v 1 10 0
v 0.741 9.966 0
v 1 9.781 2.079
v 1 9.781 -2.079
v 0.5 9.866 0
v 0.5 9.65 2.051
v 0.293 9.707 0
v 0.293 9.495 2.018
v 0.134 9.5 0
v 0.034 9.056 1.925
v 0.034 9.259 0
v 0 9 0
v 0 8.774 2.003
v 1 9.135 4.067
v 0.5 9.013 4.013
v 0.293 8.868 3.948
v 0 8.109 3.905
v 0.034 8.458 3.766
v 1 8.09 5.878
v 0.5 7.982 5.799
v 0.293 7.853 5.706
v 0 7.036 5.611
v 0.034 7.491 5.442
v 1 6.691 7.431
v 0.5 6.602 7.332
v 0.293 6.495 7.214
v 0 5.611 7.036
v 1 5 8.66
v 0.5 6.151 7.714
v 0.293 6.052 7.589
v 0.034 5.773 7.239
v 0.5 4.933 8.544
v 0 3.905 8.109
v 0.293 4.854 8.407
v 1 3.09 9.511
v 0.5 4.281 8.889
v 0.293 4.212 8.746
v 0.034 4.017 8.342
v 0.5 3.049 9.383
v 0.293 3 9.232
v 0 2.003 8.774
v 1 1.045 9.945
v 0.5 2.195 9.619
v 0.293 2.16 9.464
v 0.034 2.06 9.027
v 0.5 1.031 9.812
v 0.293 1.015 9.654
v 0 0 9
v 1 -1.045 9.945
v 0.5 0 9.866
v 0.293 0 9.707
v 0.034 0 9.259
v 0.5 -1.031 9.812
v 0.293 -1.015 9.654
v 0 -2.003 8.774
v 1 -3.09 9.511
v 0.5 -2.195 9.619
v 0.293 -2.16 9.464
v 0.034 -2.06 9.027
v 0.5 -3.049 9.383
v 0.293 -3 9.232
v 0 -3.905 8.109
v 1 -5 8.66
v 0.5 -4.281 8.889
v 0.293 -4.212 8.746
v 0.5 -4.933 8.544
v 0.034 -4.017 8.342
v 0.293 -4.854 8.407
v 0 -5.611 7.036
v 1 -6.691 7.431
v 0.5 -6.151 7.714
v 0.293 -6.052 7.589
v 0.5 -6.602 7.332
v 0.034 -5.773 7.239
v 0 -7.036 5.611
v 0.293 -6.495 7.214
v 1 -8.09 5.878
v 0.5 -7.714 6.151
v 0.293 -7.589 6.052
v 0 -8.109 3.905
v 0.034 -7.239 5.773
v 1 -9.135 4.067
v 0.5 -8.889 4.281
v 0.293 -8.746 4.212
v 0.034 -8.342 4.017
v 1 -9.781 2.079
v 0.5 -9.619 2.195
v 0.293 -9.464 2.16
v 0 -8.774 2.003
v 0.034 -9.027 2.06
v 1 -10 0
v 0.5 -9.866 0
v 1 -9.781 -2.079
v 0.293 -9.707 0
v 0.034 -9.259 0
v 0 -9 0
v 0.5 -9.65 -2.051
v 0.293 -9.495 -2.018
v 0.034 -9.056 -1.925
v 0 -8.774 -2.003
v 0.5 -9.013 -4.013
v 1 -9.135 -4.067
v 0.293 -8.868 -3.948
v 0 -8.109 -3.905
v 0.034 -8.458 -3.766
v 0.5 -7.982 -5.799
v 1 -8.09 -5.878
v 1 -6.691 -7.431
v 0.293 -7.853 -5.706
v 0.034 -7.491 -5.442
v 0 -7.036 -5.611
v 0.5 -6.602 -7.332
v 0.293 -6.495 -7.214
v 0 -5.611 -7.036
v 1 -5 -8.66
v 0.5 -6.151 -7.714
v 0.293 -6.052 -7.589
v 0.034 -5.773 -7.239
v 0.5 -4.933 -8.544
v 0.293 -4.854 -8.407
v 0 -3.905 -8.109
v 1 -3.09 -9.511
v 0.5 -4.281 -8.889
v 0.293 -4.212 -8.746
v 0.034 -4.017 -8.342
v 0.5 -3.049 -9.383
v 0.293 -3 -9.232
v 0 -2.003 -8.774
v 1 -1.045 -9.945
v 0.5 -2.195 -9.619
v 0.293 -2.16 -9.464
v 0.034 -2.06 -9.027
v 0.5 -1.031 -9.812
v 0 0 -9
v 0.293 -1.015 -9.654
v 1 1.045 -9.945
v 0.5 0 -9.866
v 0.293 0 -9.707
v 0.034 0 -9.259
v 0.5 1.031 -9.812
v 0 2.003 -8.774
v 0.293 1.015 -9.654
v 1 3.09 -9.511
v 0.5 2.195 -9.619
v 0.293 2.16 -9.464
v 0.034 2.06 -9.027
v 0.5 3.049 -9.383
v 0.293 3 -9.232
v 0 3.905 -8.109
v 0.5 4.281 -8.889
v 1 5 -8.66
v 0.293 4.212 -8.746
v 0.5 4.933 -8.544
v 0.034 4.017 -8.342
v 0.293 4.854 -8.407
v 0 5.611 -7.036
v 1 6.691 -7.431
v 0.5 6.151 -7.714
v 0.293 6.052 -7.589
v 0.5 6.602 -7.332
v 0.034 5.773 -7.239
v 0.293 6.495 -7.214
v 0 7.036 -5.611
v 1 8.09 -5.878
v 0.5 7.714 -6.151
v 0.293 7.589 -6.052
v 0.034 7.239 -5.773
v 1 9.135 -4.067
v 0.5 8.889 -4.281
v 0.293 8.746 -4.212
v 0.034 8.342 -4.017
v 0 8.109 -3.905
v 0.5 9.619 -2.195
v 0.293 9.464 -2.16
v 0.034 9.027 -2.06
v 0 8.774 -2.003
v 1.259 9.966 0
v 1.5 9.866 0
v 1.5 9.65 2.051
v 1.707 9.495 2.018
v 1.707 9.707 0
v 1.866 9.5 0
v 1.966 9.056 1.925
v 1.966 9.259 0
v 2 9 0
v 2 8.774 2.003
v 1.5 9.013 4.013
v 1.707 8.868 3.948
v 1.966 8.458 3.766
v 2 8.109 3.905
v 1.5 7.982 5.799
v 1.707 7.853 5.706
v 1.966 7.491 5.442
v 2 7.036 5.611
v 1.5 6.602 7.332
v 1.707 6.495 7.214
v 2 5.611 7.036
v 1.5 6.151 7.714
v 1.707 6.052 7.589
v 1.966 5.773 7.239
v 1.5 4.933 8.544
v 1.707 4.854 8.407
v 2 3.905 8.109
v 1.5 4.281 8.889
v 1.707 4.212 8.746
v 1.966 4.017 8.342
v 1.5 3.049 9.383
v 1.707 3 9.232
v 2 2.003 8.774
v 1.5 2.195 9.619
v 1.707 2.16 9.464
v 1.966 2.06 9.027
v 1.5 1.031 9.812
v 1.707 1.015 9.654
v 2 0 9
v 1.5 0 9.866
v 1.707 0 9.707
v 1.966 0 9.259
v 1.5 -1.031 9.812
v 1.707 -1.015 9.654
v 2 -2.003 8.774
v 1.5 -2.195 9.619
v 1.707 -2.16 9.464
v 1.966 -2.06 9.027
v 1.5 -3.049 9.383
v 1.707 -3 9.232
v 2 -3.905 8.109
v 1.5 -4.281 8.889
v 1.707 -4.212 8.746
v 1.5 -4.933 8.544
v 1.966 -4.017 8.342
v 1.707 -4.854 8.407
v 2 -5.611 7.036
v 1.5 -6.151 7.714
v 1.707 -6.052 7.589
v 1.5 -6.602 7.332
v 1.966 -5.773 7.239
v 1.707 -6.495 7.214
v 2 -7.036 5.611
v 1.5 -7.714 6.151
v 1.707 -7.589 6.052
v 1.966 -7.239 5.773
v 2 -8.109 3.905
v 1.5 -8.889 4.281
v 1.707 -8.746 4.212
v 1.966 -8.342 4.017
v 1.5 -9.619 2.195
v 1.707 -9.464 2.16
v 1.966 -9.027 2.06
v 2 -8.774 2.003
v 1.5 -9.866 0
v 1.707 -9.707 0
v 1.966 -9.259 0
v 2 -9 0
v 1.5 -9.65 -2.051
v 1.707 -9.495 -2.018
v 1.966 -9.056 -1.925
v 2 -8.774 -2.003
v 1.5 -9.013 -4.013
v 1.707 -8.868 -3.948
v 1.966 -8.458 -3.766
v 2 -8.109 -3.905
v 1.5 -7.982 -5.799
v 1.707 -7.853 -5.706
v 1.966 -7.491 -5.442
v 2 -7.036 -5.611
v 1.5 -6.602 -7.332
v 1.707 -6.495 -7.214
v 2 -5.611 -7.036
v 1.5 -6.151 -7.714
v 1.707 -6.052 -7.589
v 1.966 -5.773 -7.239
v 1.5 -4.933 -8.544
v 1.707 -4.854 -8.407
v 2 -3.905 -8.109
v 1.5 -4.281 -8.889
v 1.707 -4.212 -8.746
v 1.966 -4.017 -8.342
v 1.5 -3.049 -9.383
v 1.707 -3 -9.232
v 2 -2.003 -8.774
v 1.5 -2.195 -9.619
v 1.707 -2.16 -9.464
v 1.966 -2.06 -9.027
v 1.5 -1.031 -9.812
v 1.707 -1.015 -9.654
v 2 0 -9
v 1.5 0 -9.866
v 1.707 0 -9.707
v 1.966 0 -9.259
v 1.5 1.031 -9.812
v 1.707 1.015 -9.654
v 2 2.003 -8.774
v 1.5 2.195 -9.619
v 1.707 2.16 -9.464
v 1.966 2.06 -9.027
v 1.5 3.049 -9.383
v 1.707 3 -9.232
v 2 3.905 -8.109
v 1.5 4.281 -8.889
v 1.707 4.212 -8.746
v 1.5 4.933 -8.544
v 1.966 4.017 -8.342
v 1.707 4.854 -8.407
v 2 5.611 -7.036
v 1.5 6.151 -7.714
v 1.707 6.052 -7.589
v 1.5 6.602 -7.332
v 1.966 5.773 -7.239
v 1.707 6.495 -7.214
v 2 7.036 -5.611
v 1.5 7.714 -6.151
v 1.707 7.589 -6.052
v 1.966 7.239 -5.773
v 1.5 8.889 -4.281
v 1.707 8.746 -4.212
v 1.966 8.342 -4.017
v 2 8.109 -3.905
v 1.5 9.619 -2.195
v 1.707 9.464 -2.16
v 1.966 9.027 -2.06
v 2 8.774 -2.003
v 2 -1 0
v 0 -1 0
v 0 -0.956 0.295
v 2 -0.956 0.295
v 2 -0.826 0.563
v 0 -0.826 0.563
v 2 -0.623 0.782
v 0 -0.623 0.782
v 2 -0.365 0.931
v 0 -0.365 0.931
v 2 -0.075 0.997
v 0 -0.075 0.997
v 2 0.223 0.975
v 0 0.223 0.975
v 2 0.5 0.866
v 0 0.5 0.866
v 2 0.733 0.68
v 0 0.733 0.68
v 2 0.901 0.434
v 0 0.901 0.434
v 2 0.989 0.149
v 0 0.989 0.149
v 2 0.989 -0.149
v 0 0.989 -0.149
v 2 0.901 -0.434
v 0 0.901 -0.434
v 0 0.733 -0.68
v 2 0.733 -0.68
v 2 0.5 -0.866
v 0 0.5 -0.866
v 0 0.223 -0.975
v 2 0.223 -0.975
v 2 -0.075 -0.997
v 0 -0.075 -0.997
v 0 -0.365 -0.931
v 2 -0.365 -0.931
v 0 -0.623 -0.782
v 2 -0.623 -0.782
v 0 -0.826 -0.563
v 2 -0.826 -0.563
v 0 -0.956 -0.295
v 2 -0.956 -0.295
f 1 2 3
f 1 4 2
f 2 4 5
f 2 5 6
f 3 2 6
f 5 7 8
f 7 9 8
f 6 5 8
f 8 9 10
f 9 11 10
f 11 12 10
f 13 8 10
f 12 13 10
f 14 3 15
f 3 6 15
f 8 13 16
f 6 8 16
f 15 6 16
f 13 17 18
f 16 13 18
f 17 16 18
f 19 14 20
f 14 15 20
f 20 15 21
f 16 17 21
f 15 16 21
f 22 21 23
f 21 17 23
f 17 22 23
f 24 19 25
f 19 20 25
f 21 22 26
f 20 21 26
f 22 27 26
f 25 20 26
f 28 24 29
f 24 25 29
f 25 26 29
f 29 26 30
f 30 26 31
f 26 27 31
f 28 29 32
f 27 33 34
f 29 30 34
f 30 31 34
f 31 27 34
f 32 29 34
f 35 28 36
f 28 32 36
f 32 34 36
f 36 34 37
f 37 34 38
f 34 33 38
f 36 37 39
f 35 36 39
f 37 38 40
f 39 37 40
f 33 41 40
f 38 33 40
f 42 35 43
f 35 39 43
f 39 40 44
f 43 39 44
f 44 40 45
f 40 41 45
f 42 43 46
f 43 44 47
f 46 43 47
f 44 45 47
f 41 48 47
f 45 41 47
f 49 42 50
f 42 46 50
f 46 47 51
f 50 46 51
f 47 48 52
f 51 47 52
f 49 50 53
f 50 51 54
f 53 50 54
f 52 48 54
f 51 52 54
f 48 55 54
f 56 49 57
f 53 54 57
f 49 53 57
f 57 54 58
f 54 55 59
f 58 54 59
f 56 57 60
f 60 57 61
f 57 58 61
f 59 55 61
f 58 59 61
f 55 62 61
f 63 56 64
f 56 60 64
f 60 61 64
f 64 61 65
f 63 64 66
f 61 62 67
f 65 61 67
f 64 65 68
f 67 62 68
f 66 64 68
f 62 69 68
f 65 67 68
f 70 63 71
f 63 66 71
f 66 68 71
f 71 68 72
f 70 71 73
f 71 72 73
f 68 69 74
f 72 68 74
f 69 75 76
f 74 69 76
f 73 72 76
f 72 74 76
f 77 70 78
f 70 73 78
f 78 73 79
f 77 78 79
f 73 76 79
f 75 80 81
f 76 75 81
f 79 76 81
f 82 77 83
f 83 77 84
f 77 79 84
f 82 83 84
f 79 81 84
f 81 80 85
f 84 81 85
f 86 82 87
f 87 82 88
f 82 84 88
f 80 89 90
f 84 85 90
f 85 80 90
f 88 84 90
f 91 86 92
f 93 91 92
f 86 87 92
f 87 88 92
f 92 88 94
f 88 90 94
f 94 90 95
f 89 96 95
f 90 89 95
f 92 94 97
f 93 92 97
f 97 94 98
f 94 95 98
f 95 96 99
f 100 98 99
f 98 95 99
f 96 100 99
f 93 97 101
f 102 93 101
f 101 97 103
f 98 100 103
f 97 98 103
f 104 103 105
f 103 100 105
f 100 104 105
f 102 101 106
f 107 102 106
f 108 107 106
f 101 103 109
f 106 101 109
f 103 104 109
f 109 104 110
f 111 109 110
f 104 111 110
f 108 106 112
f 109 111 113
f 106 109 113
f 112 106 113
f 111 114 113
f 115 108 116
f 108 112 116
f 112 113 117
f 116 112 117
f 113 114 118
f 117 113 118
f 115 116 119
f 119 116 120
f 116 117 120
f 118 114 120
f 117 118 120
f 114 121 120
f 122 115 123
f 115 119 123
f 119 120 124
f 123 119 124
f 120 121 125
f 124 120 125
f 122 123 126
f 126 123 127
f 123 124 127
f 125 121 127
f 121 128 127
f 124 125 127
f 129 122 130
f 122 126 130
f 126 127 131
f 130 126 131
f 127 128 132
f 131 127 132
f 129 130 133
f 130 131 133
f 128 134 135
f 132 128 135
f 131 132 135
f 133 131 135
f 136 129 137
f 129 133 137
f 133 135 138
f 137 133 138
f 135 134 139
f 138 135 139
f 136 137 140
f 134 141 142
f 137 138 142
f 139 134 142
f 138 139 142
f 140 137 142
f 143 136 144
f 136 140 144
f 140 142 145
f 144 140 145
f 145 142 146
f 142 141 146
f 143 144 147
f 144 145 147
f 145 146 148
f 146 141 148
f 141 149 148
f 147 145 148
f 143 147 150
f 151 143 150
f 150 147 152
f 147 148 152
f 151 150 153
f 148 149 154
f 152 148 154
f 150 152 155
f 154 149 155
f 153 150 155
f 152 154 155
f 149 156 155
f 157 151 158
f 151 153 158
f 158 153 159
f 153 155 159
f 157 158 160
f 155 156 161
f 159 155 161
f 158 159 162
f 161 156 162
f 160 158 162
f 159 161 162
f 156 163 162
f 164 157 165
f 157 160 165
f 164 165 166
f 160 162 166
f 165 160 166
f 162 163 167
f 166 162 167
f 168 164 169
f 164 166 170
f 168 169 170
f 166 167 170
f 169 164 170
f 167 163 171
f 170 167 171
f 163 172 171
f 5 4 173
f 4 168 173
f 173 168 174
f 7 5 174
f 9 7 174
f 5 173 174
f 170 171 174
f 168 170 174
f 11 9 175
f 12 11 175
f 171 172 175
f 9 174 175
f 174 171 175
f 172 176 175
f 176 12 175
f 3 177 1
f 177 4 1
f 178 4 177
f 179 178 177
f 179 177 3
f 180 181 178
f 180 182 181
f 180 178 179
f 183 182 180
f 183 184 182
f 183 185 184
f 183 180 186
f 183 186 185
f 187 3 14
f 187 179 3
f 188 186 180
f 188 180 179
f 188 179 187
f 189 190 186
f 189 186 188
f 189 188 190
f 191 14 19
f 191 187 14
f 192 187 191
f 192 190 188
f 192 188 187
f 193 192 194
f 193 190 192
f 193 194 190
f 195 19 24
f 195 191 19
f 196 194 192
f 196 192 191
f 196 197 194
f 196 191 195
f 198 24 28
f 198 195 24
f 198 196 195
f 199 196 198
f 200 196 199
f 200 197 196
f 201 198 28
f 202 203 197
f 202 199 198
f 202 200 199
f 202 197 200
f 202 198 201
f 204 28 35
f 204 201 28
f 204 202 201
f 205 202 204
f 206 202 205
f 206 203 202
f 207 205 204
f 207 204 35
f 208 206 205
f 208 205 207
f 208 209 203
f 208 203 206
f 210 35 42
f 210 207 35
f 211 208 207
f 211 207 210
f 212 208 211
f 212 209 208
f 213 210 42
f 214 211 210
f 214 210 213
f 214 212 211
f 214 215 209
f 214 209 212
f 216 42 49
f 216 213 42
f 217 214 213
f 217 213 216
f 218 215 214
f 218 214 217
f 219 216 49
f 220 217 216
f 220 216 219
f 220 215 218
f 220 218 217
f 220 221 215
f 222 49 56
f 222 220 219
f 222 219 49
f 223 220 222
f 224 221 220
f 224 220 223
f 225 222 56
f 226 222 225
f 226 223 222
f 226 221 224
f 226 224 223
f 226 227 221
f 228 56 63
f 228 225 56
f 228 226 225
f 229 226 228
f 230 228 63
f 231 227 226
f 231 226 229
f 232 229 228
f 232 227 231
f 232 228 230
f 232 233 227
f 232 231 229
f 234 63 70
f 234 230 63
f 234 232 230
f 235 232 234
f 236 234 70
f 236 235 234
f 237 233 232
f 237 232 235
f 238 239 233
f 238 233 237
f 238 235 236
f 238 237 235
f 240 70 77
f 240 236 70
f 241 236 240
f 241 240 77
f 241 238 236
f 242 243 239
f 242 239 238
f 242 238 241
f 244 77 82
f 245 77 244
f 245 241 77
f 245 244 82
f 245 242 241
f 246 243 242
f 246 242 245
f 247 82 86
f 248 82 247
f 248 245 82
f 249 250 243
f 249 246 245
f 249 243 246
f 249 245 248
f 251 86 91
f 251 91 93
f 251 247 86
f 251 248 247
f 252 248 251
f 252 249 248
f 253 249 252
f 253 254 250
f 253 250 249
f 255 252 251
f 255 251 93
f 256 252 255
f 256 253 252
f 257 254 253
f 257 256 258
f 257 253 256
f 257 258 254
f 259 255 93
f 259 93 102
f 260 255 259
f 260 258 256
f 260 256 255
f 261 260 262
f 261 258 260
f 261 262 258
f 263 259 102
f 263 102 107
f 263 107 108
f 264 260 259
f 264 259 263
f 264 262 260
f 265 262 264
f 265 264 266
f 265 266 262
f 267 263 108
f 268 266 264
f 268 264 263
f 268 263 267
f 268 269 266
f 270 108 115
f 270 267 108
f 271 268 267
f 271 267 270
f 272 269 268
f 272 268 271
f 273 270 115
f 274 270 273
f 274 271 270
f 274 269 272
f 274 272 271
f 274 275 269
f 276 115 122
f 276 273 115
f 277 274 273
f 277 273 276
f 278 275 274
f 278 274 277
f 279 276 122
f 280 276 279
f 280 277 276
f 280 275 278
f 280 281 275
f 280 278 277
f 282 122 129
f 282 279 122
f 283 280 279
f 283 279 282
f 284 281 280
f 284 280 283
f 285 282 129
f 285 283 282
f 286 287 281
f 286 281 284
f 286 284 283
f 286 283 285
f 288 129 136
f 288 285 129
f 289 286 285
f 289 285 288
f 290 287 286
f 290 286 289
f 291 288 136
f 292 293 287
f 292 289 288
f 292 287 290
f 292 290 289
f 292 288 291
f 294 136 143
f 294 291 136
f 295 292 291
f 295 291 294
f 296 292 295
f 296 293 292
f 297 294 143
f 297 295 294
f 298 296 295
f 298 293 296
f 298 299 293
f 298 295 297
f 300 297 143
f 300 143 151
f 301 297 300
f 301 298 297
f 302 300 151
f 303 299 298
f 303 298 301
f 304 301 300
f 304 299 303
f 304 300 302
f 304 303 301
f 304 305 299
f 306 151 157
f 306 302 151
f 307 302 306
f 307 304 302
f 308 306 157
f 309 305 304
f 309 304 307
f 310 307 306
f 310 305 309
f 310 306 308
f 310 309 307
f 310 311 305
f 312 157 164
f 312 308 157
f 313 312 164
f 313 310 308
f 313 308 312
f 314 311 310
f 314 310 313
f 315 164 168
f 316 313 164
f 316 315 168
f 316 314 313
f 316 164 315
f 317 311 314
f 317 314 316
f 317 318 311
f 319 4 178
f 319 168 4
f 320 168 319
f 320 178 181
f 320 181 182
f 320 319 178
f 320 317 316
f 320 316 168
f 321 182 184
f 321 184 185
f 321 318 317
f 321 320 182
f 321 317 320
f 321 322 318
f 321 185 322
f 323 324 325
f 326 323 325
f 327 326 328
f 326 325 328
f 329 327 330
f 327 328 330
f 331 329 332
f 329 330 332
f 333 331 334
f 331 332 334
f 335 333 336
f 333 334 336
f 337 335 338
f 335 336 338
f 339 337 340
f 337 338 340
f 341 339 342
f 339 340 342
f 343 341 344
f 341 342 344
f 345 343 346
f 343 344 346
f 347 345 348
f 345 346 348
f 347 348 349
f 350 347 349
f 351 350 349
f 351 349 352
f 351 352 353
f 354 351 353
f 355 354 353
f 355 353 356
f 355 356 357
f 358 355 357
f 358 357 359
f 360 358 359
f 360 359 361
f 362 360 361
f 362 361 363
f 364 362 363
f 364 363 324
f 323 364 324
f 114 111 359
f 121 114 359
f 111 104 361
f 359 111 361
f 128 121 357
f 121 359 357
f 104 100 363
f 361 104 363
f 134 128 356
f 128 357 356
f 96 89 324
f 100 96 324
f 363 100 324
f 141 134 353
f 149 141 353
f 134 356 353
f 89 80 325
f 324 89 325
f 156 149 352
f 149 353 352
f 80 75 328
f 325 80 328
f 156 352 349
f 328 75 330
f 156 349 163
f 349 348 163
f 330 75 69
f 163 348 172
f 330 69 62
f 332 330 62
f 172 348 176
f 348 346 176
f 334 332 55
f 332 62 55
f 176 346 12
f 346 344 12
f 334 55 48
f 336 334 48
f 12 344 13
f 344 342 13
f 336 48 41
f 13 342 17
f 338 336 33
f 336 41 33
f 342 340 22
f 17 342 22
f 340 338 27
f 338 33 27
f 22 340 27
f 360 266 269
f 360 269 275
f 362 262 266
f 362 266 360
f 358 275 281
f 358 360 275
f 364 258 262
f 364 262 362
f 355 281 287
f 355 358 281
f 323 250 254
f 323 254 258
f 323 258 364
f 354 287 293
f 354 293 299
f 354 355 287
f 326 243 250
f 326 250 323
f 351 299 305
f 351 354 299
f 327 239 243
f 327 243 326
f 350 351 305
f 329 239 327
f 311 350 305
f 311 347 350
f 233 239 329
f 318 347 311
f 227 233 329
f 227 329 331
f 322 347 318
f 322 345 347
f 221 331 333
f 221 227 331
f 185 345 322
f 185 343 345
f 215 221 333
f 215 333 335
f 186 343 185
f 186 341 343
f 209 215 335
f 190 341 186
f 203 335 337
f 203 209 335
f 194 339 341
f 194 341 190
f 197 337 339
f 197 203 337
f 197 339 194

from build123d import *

# Parameters (mm, degrees)
F0_R     = 10
F1_DEPTH = 2
F2_R     = 0.99999
F4_D     = 2


# Not quite as in the source:
# - a fillet or chamfer is up to 0.001 mm smaller than in the source, because OpenCascade refuses the exact size


with BuildPart() as f1:
    # F0 (on Right) → F1 (new body)
    with BuildSketch(Plane.YZ):
        Circle(F0_R)
    extrude(amount=F1_DEPTH)

    # F2 (radius 1 in the source; OpenCascade refuses exactly that, so slightly less here)
    f2_edges = [f1.edges().sort_by_distance(p)[0] for p in [
        (1, 10, 0),
        (0, -10, 0),
        (2, -10, 0),
    ]]
    fillet(f2_edges, radius=F2_R)

    # F4 (through all)
    with Locations(Plane.YZ.offset(2)):
        with Locations((0, 0)):
            Hole(F4_D / 2)


solid = f1.part
